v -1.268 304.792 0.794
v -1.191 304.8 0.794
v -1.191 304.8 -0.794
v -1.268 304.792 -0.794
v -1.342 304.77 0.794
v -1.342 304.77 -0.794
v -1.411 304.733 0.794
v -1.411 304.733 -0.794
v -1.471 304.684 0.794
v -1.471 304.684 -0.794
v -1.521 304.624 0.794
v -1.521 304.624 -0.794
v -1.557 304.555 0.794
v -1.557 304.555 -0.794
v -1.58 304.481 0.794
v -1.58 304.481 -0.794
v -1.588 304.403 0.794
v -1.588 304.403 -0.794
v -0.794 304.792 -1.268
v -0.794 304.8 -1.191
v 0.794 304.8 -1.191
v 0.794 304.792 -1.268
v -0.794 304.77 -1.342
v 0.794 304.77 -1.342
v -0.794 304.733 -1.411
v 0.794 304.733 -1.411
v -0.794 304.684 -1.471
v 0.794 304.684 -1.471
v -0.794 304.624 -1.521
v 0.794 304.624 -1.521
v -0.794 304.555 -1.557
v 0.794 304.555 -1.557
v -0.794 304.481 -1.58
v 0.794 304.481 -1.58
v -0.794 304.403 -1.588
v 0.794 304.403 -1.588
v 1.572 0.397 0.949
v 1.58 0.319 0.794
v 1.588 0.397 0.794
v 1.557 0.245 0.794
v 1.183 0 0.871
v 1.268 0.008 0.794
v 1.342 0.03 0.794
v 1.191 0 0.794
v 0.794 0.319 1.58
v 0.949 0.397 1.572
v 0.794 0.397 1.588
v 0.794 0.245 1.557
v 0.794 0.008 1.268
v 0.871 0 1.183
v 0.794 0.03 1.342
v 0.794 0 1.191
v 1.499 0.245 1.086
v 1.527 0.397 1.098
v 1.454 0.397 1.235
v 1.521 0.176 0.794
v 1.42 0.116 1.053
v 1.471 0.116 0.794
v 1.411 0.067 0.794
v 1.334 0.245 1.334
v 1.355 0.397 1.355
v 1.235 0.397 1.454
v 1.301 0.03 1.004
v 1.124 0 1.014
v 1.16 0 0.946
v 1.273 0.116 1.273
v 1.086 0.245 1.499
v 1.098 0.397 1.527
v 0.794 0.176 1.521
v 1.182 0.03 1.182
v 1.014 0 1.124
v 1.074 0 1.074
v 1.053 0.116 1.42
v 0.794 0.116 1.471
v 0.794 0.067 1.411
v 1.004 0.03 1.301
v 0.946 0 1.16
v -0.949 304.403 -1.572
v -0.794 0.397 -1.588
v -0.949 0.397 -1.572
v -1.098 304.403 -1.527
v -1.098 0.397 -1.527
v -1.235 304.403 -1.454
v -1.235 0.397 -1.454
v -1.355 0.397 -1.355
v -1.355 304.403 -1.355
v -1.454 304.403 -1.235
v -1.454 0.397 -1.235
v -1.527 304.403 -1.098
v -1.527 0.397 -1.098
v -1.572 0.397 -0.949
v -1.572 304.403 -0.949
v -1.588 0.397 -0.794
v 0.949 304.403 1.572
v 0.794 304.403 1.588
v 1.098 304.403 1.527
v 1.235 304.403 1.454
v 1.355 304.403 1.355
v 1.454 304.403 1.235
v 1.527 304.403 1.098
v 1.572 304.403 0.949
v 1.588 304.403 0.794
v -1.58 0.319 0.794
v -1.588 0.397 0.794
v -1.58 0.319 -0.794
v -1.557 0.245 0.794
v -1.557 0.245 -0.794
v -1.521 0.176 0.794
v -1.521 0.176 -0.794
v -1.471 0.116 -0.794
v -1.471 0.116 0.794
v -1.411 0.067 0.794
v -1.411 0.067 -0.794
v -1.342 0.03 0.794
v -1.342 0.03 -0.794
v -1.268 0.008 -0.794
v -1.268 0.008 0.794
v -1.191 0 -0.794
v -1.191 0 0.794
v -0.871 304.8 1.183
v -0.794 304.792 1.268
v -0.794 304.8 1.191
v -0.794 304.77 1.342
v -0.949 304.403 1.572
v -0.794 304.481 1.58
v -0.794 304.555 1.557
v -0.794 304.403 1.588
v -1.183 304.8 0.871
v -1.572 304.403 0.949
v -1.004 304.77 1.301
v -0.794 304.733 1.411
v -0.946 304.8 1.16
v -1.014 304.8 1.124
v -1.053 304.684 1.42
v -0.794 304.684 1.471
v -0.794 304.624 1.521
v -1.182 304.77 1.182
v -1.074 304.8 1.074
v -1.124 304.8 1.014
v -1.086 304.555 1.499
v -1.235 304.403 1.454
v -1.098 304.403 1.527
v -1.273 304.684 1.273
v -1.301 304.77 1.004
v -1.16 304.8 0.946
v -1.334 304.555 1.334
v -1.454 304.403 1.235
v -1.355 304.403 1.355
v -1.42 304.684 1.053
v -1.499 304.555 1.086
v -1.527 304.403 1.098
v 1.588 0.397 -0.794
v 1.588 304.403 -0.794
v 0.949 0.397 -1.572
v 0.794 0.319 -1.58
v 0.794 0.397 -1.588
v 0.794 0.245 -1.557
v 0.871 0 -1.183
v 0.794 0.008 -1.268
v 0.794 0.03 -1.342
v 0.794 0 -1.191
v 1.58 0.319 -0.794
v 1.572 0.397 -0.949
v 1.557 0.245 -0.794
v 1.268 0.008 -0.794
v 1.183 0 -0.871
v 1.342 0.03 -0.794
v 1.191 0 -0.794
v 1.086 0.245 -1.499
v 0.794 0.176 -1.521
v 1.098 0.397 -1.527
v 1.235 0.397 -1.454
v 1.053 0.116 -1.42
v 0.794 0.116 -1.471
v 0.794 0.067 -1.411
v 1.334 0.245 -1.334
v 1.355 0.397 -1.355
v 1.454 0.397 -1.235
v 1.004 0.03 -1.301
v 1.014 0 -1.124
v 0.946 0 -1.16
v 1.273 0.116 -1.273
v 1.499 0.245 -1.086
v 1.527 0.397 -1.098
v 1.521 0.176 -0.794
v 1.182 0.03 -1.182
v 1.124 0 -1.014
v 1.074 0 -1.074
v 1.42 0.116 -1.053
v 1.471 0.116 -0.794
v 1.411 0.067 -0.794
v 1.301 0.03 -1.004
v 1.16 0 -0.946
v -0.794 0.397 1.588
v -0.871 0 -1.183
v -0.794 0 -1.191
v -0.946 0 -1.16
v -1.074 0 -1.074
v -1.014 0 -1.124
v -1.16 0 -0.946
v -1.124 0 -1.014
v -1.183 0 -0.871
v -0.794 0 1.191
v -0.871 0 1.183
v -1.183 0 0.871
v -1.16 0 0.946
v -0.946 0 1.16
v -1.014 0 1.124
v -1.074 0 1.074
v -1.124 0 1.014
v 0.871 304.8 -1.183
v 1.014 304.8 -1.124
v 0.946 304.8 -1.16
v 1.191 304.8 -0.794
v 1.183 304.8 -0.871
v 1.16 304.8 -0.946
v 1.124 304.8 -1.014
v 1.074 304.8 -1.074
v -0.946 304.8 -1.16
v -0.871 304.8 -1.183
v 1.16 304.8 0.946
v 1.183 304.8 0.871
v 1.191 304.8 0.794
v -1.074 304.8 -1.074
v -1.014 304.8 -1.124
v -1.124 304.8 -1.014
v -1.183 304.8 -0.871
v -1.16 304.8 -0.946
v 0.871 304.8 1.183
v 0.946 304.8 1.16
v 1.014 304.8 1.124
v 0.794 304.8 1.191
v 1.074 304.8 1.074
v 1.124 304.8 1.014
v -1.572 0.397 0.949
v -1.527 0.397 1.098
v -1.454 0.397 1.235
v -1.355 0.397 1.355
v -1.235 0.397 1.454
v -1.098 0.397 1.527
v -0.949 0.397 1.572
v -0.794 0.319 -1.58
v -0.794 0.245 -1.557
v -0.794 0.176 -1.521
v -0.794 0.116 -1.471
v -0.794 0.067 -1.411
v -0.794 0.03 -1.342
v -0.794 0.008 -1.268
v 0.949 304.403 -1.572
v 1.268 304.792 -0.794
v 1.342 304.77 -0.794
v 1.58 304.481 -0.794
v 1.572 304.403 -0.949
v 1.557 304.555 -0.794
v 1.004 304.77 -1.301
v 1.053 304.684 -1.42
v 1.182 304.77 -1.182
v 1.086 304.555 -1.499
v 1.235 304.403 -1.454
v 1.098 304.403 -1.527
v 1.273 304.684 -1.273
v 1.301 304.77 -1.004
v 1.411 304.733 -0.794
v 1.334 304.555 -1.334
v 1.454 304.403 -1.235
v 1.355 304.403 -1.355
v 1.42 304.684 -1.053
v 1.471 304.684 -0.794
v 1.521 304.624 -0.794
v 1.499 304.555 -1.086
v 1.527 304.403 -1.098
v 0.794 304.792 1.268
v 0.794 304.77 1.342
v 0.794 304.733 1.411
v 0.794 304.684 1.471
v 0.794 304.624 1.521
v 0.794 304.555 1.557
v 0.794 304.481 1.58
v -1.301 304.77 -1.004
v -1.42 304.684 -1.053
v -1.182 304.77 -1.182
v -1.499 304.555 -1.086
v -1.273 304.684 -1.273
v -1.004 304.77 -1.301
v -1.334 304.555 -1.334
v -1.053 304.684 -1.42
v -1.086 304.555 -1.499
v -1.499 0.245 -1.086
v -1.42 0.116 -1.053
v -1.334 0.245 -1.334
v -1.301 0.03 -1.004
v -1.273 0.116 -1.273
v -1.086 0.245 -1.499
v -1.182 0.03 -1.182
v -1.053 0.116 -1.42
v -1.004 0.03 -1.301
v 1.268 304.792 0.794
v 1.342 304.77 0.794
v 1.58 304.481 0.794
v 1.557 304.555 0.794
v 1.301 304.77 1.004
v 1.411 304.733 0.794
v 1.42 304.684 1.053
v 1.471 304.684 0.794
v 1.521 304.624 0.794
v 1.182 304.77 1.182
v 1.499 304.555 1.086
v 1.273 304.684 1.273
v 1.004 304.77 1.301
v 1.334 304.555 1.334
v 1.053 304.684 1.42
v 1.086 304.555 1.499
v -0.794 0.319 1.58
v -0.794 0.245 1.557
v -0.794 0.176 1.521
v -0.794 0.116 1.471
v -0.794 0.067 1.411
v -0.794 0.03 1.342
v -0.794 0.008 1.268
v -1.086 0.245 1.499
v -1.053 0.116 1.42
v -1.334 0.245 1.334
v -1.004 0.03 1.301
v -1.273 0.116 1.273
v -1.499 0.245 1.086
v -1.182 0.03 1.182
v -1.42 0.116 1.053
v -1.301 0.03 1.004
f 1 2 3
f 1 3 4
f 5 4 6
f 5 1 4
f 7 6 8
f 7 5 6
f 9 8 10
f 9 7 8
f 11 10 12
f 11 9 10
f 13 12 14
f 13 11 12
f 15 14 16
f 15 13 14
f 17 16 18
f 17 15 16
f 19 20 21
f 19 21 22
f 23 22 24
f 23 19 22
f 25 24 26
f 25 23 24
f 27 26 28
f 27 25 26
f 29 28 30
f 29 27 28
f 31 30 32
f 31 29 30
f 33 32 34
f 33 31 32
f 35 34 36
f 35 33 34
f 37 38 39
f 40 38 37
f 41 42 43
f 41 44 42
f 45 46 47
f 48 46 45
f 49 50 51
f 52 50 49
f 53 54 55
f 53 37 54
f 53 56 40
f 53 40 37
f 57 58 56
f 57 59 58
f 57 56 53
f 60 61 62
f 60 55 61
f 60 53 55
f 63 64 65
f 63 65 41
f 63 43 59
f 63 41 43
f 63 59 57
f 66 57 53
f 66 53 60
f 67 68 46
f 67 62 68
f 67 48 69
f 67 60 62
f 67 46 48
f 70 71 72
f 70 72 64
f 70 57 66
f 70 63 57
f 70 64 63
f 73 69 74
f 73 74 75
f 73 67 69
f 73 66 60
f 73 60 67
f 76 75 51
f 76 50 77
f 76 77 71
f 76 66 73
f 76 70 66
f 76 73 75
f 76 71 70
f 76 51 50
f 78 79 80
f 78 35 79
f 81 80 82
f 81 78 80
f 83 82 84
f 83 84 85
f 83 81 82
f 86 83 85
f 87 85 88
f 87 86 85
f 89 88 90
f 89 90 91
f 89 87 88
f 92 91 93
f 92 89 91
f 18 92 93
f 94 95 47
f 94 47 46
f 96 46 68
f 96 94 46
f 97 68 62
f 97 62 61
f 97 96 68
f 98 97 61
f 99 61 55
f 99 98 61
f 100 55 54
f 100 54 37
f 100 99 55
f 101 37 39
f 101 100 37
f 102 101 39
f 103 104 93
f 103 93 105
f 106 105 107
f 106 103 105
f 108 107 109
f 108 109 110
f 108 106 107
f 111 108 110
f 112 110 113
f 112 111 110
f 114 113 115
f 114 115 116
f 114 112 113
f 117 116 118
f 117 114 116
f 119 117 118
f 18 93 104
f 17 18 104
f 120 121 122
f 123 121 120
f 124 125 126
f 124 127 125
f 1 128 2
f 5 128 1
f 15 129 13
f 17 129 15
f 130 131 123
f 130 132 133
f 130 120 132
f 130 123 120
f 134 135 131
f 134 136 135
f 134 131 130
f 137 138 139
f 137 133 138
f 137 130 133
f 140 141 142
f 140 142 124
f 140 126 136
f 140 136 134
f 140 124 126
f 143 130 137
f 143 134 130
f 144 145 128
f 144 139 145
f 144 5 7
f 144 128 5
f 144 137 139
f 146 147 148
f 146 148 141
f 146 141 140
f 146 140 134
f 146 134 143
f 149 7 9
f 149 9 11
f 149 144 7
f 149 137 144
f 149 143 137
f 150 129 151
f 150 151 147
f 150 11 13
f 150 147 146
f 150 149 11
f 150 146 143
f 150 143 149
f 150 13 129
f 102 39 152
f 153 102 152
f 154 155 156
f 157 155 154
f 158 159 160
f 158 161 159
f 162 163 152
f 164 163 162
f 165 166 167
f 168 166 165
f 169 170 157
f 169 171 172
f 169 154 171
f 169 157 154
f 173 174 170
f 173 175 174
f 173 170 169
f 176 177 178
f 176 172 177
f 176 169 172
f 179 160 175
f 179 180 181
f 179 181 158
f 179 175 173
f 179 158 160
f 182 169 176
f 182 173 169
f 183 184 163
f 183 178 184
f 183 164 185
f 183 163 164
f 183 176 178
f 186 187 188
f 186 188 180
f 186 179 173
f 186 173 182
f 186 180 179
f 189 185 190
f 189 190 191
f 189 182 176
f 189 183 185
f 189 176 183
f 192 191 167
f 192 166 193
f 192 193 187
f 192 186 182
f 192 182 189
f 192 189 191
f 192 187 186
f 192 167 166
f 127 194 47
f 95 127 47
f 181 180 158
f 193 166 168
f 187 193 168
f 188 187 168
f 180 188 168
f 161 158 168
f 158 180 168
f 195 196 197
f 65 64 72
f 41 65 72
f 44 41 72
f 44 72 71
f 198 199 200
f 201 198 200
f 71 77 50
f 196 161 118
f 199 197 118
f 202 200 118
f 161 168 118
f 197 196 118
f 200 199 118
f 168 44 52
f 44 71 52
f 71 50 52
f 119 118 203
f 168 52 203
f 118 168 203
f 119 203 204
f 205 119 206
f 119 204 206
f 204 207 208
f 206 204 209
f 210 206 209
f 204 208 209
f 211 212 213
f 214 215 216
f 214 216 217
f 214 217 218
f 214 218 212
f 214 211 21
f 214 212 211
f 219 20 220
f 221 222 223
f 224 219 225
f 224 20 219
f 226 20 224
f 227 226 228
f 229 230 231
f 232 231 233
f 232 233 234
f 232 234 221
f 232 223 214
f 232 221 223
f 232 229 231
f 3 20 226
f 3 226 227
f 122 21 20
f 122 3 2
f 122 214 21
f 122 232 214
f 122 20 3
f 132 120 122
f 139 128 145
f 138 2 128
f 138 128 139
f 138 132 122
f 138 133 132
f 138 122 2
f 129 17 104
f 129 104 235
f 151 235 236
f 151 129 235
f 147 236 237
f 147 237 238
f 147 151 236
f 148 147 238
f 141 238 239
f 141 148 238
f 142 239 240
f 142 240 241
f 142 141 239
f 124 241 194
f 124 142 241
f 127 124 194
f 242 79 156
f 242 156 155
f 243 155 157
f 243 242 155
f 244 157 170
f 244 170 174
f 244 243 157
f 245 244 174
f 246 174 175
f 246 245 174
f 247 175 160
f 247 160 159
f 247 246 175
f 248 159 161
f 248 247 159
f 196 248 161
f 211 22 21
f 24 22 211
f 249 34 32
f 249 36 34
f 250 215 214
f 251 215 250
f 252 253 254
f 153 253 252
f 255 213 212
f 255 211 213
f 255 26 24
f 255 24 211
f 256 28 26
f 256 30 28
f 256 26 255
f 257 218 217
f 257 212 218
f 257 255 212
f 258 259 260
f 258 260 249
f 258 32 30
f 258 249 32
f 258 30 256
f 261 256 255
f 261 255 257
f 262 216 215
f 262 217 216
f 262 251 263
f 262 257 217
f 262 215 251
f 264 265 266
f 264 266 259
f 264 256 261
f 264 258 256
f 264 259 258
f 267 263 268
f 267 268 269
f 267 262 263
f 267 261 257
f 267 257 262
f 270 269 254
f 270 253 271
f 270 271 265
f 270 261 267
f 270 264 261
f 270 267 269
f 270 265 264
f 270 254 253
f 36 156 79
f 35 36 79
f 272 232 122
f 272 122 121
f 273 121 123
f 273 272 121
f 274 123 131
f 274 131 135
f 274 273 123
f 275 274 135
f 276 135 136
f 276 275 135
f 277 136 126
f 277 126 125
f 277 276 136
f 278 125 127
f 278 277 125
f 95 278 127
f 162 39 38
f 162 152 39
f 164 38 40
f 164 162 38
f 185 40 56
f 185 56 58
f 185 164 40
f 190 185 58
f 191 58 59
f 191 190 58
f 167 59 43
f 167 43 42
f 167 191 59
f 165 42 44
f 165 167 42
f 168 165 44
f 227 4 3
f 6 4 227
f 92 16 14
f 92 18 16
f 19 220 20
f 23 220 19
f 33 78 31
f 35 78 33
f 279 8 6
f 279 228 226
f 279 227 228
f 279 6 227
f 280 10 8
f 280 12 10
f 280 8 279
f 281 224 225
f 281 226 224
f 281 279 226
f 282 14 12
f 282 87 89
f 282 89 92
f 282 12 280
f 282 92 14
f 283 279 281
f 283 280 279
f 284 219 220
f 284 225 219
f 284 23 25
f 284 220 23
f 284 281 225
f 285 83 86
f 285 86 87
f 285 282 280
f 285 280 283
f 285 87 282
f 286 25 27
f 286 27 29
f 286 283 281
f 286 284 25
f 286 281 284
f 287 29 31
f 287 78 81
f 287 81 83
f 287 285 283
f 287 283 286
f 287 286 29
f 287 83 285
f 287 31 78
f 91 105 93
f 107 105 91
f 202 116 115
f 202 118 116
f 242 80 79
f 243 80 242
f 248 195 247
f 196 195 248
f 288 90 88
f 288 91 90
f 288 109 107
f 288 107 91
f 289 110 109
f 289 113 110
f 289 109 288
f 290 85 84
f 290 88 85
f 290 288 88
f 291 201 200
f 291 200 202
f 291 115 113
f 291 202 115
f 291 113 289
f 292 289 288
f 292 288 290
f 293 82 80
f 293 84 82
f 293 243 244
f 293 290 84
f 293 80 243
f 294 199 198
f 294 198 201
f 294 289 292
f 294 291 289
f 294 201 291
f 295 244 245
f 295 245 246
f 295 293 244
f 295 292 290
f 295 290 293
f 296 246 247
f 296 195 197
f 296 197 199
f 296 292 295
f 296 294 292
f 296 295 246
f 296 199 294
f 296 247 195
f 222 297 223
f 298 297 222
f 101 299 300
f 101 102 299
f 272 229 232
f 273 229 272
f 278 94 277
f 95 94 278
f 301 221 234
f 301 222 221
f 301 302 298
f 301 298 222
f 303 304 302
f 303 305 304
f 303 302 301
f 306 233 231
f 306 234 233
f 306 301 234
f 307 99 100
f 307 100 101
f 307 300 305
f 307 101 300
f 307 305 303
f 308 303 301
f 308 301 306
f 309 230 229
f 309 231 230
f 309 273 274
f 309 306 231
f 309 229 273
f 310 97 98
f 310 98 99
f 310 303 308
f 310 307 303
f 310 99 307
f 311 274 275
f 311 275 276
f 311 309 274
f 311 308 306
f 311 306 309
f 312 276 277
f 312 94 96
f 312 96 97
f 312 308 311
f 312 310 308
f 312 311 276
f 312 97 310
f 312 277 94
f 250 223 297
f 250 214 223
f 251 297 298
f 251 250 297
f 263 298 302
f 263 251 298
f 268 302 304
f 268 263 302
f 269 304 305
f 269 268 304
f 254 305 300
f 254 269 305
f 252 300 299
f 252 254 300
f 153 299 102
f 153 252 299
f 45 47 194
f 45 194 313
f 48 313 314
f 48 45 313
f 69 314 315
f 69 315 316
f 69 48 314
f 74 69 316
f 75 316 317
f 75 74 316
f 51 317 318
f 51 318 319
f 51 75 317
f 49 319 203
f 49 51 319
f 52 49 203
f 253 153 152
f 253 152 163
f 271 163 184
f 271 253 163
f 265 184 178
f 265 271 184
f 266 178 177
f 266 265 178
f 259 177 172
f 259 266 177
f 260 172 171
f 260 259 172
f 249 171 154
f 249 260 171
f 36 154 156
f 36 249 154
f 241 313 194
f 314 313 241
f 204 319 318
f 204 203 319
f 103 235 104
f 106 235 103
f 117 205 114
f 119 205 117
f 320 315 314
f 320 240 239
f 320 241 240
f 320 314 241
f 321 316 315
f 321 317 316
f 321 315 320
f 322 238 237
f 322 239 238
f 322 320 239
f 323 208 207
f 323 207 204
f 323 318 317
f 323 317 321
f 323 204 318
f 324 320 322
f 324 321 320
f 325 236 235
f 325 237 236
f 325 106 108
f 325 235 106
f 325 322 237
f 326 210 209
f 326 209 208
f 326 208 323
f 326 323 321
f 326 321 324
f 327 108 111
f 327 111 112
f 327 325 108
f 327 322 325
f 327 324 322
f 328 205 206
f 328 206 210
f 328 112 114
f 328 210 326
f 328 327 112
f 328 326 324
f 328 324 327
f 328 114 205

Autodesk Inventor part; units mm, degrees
ref_plane "YZ Plane" through (0, 0, 0) normal (1, 0, 0) x (0, 1, 0)
ref_plane "XZ Plane" through (0, 0, 0) normal (0, 1, 0) x (-1, 0, 0)
ref_plane "XY Plane" through (0, 0, 0) normal (0, 0, 1) x (1, 0, 0)
sketch "Sketch1" plane through (0, 0, 0) normal (0, 1, 0) x (-1, 0, 0)
  line L0 (-1.5875, -1.5875) -> (1.5875, -1.5875)
  line L1 (1.5875, -1.5875) -> (1.5875, 1.5875)
  line L2 (1.5875, 1.5875) -> (-1.5875, 1.5875)
  line L3 (-1.5875, 1.5875) -> (-1.5875, -1.5875)
  line L4 (-1.5875, -1.5875) -> (1.5875, 1.5875) construction
  line L5 (1.5875, -1.5875) -> (-1.5875, 1.5875) construction
  point P0 (0, 0)
  dimension "d0" = 3.175
  dimension "d1" = 3.175
extrude "Extrusion1" add sketch "Sketch1" along normal blind 304.8
fillet "Fillet1" radius 0.7937 4 edges at (1.5875, 152.4, -1.5875) (-1.5875, 152.4, -1.5875) (1.5875, 152.4, 1.5875) (-1.5875, 152.4, 1.5875)
fillet "Fillet2" radius 0.3969 16 edges at (1.5875, 0, 0) (1.355, 0, -1.355) (0, 0, -1.5875) (-1.355, 0, -1.355) (-1.5875, 0, 0) (-1.355, 0, 1.355) (0, 0, 1.5875) (1.355, 0, 1.355) (0, 304.8, 1.5875) (-1.355, 304.8, 1.355) (-1.5875, 304.8, 0) (-1.355, 304.8, -1.355) (0, 304.8, -1.5875) (1.355, 304.8, -1.355) (1.5875, 304.8, 0) (1.355, 304.8, 1.355)
properties part number "12inch shaft" material "Stainless Steel"
